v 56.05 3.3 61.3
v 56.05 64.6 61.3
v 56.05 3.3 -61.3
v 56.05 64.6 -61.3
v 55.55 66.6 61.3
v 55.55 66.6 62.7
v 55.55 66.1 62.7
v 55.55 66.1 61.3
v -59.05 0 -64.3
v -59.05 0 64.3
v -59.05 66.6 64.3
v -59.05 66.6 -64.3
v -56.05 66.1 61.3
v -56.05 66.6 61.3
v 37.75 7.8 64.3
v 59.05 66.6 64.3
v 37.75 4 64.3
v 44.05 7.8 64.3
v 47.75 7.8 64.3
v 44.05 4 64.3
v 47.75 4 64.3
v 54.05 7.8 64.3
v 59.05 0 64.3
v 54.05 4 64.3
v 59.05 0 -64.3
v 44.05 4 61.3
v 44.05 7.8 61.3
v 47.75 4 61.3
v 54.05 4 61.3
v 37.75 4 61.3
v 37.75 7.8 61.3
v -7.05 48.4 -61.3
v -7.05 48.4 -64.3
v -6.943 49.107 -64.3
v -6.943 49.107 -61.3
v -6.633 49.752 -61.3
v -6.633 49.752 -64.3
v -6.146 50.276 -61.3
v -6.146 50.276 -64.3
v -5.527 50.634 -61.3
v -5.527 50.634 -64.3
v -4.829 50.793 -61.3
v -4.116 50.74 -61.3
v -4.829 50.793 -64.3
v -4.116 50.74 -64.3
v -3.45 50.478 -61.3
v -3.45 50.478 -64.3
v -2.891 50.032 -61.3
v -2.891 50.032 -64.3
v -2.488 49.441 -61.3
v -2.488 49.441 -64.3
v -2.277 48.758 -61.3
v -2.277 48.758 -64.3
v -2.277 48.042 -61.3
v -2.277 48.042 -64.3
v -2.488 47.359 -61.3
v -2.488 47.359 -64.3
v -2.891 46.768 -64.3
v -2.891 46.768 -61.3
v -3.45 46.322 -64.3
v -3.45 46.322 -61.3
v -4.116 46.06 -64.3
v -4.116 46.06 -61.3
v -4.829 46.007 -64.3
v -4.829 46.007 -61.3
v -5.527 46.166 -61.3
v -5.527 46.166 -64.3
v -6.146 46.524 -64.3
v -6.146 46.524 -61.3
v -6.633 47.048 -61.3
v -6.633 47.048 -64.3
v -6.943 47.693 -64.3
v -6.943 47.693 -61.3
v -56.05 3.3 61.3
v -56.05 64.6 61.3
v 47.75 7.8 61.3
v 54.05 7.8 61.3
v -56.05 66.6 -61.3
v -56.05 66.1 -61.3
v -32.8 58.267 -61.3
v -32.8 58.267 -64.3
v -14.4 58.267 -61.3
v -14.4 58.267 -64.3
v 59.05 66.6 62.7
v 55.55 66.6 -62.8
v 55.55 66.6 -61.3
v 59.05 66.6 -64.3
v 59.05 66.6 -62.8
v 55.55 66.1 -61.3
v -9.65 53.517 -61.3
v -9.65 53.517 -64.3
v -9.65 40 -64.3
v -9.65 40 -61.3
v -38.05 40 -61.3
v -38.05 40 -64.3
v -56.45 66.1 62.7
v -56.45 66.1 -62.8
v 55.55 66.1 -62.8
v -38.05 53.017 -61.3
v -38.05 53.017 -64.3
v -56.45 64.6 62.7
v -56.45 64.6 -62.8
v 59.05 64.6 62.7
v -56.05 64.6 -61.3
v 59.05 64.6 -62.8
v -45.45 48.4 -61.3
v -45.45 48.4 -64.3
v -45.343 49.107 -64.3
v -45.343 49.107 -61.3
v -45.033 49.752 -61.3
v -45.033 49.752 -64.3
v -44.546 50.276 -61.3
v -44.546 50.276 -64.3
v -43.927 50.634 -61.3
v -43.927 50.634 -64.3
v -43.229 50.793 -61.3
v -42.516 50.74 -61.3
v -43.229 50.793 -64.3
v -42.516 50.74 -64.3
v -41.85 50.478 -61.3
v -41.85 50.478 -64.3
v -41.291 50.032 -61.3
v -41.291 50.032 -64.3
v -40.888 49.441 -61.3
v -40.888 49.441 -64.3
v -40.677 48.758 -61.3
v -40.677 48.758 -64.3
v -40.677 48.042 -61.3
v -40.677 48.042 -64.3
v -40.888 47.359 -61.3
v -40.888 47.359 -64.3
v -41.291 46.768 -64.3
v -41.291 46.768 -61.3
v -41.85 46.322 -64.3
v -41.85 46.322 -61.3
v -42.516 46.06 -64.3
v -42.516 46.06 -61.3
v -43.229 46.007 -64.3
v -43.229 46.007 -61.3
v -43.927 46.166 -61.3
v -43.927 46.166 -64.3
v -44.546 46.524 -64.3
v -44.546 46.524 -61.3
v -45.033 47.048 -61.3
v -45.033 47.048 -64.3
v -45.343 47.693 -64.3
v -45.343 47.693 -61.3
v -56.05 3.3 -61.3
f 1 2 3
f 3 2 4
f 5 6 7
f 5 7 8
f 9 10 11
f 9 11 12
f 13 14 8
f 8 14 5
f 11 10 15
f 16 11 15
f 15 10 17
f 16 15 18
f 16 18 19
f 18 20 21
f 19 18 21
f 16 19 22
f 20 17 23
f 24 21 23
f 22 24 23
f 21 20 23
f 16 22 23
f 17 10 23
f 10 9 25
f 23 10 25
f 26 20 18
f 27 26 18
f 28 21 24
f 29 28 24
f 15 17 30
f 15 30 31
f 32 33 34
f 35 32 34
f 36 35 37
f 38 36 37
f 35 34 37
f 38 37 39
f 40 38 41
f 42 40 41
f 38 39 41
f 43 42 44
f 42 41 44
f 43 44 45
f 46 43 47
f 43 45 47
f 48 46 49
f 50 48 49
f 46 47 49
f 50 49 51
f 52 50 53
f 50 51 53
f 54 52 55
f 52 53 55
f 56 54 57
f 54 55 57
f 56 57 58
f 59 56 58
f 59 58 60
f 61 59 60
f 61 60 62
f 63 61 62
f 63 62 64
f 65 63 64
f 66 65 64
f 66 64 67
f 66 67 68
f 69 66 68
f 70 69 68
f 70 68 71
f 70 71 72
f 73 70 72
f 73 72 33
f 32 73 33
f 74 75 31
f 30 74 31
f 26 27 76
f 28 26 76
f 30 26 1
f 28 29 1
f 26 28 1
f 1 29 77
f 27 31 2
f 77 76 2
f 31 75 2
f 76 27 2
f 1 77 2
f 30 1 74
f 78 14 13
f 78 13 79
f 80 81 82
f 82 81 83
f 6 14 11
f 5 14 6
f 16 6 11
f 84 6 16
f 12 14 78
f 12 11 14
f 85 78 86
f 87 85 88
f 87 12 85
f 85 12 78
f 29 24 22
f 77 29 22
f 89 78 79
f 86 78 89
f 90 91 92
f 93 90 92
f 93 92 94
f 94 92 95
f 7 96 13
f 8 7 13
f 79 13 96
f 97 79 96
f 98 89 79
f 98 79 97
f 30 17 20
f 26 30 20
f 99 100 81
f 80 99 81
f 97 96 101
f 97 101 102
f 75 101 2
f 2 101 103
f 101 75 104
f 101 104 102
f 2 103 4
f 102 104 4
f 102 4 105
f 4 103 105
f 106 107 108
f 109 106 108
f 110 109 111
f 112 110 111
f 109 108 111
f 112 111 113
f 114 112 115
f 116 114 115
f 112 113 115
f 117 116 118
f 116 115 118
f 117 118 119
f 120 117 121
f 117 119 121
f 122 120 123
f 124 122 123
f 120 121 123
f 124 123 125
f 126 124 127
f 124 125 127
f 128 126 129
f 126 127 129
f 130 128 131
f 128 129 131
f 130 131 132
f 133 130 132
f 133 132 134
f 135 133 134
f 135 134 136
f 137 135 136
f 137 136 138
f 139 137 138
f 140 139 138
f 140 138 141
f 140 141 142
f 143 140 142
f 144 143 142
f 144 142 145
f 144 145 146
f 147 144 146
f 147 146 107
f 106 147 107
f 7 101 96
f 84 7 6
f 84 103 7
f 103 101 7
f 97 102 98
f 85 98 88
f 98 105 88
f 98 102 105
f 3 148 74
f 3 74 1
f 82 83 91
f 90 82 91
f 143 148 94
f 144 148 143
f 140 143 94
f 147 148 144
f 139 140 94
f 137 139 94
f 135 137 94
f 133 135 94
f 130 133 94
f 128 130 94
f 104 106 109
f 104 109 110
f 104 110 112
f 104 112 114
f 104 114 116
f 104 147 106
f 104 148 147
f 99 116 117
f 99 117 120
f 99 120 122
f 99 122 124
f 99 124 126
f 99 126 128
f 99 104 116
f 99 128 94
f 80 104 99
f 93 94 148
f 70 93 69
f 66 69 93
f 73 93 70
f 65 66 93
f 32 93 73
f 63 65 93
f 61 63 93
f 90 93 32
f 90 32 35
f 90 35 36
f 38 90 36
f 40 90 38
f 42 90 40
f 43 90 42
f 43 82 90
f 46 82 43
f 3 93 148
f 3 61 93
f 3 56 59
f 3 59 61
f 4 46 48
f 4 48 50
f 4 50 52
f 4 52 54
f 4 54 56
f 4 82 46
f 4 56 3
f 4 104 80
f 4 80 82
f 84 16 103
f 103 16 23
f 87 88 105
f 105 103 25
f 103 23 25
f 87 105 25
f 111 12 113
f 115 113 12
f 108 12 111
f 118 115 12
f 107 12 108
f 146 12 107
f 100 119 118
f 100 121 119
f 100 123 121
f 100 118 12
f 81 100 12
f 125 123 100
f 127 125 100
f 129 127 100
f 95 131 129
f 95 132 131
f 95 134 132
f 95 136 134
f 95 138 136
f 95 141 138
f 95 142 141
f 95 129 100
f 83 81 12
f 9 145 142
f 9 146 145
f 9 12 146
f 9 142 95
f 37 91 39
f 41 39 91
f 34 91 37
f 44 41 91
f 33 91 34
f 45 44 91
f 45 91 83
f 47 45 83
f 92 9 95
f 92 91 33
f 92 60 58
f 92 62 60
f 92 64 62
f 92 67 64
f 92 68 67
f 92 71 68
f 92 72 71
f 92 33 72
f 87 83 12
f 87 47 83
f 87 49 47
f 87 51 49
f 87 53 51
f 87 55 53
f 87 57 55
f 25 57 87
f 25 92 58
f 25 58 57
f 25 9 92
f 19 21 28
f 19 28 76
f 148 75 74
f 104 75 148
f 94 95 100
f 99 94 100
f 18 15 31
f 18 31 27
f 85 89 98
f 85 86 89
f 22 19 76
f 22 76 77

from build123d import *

# Parameters (mm, degrees)
SKETCH1_W           = 118.1
SKETCH1_H           = 128.6
BOSS_EXTRUDE2_DEPTH = 66.6
SKETCH5_R           = 2.4
CUT_EXTRUDE2_DEPTH  = 4
SKETCH4_W           = 6.3
SKETCH4_H           = 3.8
CUT_EXTRUDE3_DEPTH  = 4
SKETCH6_W           = 112.1
SKETCH6_H           = 122.6
CUT_EXTRUDE4_DEPTH  = 63.3
SKETCH9_W           = 125.5
SKETCH9_H           = 1.5
CUT_EXTRUDE7_DEPTH  = 115.5
SKETCH10_W          = 125.5
SKETCH10_H          = 1
CUT_EXTRUDE8_DEPTH  = 3.5


with BuildPart() as part:
    # Sketch1 → Boss-Extrude2 (new body)
    with BuildSketch(Plane(origin=(0, 0, 0), x_dir=(1, 0, 0), z_dir=(0, 1, 0))):
        Rectangle(SKETCH1_W, SKETCH1_H)
    extrude(amount=BOSS_EXTRUDE2_DEPTH)

    # Sketch5 → Cut-Extrude2 (cut)
    with BuildSketch(Plane(origin=(0, 0, -64.3), x_dir=(-1, 0, 0), z_dir=(0, 0, -1))):
        with Locations((43.05, 48.4)):
            Circle(SKETCH5_R)
        with Locations((4.65, 48.4)):
            Circle(SKETCH5_R)
        Polygon((9.65, 40), (38.05, 40), (38.05, 53.016960095), (32.8, 58.266960095), (14.4, 58.266960095), (9.65, 53.516960095), align=None)
    extrude(amount=-CUT_EXTRUDE2_DEPTH, mode=Mode.SUBTRACT)

    # Sketch4 → Cut-Extrude3 (cut)
    with BuildSketch(Plane.XY.offset(64.3)):
        with Locations((50.9, 5.9)):
            Rectangle(SKETCH4_W, SKETCH4_H)
        with Locations((40.9, 5.9)):
            Rectangle(SKETCH4_W, SKETCH4_H)
    extrude(amount=-CUT_EXTRUDE3_DEPTH, mode=Mode.SUBTRACT)

    # Sketch6 → Cut-Extrude4 (cut)
    with BuildSketch(Plane(origin=(0, 66.6, 0), x_dir=(1, 0, 0), z_dir=(0, 1, 0))):
        Rectangle(SKETCH6_W, SKETCH6_H)
    extrude(amount=-CUT_EXTRUDE4_DEPTH, mode=Mode.SUBTRACT)

    # Sketch9 → Cut-Extrude7 (cut)
    with BuildSketch(Plane(origin=(59.05, 0, 0), x_dir=(0, 0, -1), z_dir=(1, 0, 0))):
        with Locations((0.05, 65.35)):
            Rectangle(SKETCH9_W, SKETCH9_H)
    extrude(amount=-CUT_EXTRUDE7_DEPTH, mode=Mode.SUBTRACT)

    # Sketch10 → Cut-Extrude8 (cut)
    with BuildSketch(Plane(origin=(59.05, 0, 0), x_dir=(0, 0, -1), z_dir=(1, 0, 0))):
        with Locations((0.05, 66.1)):
            Rectangle(SKETCH10_W, SKETCH10_H)
    extrude(amount=-CUT_EXTRUDE8_DEPTH, mode=Mode.SUBTRACT)


solid = part.part
